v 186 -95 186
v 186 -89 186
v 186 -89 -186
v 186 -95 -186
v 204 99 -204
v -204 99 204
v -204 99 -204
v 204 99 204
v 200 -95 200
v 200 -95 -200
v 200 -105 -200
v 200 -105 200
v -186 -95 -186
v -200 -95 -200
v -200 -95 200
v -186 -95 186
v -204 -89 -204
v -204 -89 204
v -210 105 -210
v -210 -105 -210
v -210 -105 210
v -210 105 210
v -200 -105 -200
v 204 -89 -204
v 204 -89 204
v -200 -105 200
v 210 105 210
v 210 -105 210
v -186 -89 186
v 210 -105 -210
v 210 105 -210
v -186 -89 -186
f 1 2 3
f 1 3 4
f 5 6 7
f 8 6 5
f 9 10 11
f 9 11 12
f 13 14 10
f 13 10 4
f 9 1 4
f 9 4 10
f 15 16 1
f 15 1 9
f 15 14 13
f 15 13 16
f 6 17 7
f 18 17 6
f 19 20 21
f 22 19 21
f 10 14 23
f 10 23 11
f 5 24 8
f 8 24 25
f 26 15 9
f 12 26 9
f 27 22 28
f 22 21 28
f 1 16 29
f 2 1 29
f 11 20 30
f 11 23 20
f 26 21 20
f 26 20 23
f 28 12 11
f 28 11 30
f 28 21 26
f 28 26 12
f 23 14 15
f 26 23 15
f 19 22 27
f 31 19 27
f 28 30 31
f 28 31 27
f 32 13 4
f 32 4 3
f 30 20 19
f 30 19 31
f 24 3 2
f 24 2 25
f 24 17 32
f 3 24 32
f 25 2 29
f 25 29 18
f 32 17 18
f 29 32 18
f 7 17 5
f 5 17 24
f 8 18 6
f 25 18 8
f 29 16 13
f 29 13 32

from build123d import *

# Parameters (mm, degrees)
F0_W      = 420
F0_H      = 420
F1_DEPTH  = 105
F2_T      = -6
F3_W      = 6
F3_H      = 408
F4_DEPTH  = 18
F5_W      = 6
F5_H      = 408
F6_DEPTH  = 18
F7_W      = 6
F7_H      = 18
F8_DEPTH  = 372
F9_W      = 6
F9_H      = 18
F10_DEPTH = 372
F11_W     = 408
F11_H     = 408
F11_W_2   = 400
F11_H_2   = 400
F12_DEPTH = 10


with BuildPart() as f1:
    # F0 (on Front) → F1 (new body, symmetric)
    with BuildSketch(Plane.XZ):
        Rectangle(F0_W, F0_H)
    extrude(amount=F1_DEPTH, both=True)

    # F2
    f2_openings = [f1.faces().sort_by_distance(p)[0] for p in [
        (0, -105, 0),
    ]]
    offset(amount=F2_T, openings=f2_openings)

    # F3 (on face) → F4 (join)
    with BuildSketch(Plane.YZ.offset(-204)):
        with Locations((-92, 0)):
            Rectangle(F3_W, F3_H)
    extrude(amount=F4_DEPTH)

    # F5 (on face) → F6 (join)
    with BuildSketch(Plane(origin=(204, 0, 0), x_dir=(0, -1, 0), z_dir=(-1, 0, 0))):
        with Locations((92, 0)):
            Rectangle(F5_W, F5_H)
    extrude(amount=F6_DEPTH)

    # F7 (on face) → F8 (join, through all)
    with BuildSketch(Plane.YZ.offset(-186)):
        with Locations((-92, 195)):
            Rectangle(F7_W, F7_H)
    extrude(amount=F8_DEPTH)

    # F9 (on face) → F10 (join, through all)
    with BuildSketch(Plane.YZ.offset(-186)):
        with Locations((-92, -195)):
            Rectangle(F9_W, F9_H)
    extrude(amount=F10_DEPTH)

    # F11 (on face) → F12 (join)
    with BuildSketch(Plane.XZ.offset(95)):
        Rectangle(F11_W, F11_H)
        Rectangle(F11_W_2, F11_H_2, mode=Mode.SUBTRACT)
    extrude(amount=F12_DEPTH)


solid = f1.part
